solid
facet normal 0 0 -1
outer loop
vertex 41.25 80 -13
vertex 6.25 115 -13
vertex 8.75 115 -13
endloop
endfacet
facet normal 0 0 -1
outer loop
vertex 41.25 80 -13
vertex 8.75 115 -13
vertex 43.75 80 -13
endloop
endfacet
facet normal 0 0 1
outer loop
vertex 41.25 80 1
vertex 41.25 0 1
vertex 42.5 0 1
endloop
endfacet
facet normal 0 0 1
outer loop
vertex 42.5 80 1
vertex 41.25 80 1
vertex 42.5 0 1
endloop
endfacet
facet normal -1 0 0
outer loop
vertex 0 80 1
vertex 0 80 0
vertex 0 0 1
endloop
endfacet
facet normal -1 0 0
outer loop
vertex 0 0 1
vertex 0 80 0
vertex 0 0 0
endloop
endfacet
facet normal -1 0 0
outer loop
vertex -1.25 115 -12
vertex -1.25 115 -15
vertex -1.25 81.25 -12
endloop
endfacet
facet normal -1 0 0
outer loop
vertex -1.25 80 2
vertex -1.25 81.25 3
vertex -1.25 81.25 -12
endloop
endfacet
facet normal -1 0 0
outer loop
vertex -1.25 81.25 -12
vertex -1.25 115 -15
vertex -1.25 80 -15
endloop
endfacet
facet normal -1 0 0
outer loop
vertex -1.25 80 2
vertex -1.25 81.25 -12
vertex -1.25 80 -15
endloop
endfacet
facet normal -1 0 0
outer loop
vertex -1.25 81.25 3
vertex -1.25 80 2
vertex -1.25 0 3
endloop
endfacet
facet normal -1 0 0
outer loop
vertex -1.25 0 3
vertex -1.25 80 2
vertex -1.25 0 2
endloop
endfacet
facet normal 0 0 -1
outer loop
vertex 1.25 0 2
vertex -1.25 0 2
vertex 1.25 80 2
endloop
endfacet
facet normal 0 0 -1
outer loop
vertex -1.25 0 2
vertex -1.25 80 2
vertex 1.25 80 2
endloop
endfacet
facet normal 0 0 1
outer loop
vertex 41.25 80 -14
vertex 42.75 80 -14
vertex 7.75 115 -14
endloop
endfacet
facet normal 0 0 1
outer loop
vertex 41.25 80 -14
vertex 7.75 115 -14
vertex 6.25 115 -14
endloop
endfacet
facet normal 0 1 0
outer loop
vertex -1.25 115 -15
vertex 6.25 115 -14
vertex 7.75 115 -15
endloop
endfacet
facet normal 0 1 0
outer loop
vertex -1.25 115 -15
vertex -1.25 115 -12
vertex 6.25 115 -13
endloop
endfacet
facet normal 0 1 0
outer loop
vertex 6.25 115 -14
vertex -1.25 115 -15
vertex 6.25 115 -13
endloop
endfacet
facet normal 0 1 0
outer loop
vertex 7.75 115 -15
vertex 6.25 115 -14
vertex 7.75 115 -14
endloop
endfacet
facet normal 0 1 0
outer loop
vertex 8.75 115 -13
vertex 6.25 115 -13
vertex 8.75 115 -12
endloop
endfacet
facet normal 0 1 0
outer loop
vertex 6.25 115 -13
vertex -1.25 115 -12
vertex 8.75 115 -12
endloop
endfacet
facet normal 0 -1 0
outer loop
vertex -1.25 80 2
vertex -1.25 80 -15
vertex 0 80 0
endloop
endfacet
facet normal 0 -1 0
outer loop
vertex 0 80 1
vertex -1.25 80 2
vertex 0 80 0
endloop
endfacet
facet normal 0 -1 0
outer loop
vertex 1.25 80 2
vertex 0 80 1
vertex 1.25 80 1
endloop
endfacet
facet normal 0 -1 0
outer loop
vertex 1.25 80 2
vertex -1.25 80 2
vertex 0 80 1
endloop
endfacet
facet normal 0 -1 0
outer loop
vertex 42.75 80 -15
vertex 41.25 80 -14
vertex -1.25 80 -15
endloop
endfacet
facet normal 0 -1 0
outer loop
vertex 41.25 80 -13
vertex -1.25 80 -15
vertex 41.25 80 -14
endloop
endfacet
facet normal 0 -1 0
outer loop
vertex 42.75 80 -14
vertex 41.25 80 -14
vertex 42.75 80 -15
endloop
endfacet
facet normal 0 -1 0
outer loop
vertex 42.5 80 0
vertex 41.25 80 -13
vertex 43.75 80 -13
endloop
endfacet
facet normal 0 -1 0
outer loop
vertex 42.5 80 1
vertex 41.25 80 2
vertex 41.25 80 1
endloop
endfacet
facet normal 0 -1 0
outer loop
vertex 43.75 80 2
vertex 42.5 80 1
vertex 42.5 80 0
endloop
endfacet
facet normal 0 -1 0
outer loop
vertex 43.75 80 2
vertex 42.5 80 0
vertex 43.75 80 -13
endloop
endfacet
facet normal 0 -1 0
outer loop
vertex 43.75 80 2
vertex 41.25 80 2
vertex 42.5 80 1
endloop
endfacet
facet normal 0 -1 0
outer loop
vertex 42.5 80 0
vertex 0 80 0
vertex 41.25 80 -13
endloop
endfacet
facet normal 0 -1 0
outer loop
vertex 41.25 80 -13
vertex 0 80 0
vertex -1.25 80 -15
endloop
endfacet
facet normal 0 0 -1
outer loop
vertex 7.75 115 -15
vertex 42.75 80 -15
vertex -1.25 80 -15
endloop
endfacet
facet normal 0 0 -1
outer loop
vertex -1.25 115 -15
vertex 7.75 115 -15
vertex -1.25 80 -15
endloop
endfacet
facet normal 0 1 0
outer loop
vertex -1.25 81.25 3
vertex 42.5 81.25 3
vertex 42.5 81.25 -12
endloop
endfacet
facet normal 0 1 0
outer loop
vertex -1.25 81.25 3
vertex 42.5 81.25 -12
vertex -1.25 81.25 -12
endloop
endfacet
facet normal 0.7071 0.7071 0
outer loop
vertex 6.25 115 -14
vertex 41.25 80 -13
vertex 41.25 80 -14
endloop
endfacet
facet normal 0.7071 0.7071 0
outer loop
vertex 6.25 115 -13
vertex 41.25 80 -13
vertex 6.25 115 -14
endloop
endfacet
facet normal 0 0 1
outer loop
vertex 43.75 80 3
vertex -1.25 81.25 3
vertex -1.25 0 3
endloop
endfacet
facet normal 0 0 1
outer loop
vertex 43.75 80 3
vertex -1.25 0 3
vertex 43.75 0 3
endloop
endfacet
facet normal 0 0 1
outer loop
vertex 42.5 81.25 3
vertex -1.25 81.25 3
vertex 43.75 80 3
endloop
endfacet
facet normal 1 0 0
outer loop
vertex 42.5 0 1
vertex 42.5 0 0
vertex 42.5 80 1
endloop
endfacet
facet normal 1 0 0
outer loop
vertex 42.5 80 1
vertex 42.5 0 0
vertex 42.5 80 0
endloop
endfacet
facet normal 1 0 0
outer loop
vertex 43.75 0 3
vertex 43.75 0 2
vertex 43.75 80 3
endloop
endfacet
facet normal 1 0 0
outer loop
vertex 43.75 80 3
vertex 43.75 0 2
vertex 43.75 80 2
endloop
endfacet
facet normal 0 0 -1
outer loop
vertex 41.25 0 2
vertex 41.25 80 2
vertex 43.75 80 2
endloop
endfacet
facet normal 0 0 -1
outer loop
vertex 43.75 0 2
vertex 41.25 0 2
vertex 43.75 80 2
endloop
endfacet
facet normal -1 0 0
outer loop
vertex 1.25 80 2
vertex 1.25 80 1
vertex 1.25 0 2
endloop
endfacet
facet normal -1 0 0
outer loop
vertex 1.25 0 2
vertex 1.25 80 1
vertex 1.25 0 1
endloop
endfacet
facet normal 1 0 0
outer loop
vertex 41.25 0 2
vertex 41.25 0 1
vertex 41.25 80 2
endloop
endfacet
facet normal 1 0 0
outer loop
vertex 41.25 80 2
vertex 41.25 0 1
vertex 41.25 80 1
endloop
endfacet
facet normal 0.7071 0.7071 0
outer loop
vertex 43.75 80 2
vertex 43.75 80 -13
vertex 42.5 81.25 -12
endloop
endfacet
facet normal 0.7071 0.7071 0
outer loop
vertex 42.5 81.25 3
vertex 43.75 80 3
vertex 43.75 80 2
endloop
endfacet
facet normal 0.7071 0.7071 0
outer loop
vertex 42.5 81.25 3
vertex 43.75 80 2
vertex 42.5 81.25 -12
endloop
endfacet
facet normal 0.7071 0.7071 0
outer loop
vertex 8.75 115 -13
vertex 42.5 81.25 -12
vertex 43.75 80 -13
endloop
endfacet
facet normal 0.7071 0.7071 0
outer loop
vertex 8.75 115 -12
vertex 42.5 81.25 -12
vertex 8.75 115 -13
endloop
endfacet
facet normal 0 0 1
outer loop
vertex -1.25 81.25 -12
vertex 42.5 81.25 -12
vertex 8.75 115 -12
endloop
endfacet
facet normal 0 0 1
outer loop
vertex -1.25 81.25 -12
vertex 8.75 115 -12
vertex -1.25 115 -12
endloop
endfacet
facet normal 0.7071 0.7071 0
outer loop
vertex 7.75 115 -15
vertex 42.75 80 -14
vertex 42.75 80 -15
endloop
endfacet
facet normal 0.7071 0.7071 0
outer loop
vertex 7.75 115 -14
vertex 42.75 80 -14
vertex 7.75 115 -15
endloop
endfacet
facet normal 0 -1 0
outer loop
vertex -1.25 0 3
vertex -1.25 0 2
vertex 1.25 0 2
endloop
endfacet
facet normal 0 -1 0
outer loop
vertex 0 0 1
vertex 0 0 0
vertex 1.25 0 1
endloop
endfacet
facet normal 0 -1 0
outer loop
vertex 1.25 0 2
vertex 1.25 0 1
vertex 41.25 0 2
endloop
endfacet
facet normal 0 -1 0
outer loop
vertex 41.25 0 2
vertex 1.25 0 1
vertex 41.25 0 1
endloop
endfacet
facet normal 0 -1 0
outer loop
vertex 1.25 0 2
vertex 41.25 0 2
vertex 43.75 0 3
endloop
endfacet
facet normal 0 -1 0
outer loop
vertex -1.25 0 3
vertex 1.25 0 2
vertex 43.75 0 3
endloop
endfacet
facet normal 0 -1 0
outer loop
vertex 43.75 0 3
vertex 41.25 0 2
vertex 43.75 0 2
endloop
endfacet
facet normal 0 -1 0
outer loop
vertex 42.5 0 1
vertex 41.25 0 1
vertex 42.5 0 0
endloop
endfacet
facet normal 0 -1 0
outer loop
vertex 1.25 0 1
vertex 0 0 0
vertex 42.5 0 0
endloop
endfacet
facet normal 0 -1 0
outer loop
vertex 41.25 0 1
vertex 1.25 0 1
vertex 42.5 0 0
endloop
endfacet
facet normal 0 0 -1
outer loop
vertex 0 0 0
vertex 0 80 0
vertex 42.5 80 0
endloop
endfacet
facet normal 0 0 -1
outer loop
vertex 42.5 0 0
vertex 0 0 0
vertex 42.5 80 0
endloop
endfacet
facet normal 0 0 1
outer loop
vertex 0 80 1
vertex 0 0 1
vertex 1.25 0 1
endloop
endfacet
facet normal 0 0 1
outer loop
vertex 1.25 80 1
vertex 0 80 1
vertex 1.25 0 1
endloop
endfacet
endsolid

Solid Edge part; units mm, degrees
sketch "Sketch1" plane through (0, 0, 0) normal (0, 0, 1) x (1, 0, 0)
  line L0 (0, 0) -> (42.5, 0)
  line L1 (42.5, 0) -> (42.5, 80)
  line L2 (42.5, 80) -> (0, 80)
  line L3 (0, 80) -> (0, 0)
extrude "Protrusion1" add sketch "Sketch1" along normal blind 1
sketch "Sketch2" plane through (21.25, 40, 1) normal (0, 0, 1) x (1, 0, 0)
  line L0 (-20, 40) -> (-20, -40)
  line L1 (-20, -40) -> (20, -40)
  line L2 (20, -40) -> (20, 40)
  line L3 (20, 40) -> (-20, 40)
extrude "Vysunutí_2" add sketch "Sketch2" along normal blind 1
sketch "Sketch3" plane through (21.25, 40, 2) normal (0, 0, 1) x (1, 0, 0)
  line L0 (-22.5, -40) -> (22.5, -40)
  line L1 (22.5, -40) -> (22.5, 40)
  line L2 (22.5, 40) -> (-22.5, 40)
  line L3 (-22.5, 40) -> (-22.5, -40)
extrude "Vysunutí_3" add sketch "Sketch3" along normal blind 1
sketch "Sketch4" plane through (21.25, 40, 3) normal (0, 0, 1) x (1, 0, 0)
  line L0 (-22.5, 75) -> (-22.5, 40)
  line L1 (-22.5, 40) -> (22.5, 40)
  line L2 (22.5, 40) -> (-12.5, 75)
  line L3 (-22.5, 75) -> (-12.5, 75)
extrude "Protrusion2" add sketch "Sketch4" against normal blind 16
sketch "Sketch5" plane through (21.25, 57.5, 3) normal (0, 0, 1) x (0, -1, 0)
  line L0 (-23.75, 21.25) -> (-23.75, -22.5)
  line L1 (-23.75, -22.5) -> (-57.5, -22.5)
  line L2 (-57.5, -22.5) -> (-57.5, -12.5)
  line L3 (-57.5, -12.5) -> (-23.75, 21.25)
extrude "Cutout1" cut sketch "Sketch5" against normal blind 15
sketch "Sketch6" plane through (21.25, 97.5, -13) normal (0, 0, -1) x (0, -1, 0)
  line L0 (-15, 12.5) -> (-7.6278, 5.1278)
  line L1 (-7.6278, 5.1278) -> (16.25, -18.75)
  line L2 (17.5, -20) -> (16.25, -18.75)
  line L3 (17.5, 22.5) -> (17.5, -20)
  line L4 (16.25, 22.5) -> (17.5, 22.5)
  line L5 (16.25, 22.5) -> (-15, 22.5)
  line L6 (-17.5, 22.5) -> (-15, 22.5)
  line L7 (-17.5, 15) -> (-17.5, 22.5)
  line L8 (-15, 12.5) -> (-17.5, 15)
extrude "Vysunutí_6" add sketch "Sketch6" along normal blind 1
sketch "Sketch7" plane through (20, 96.25, -14) normal (0, 0, -1) x (-1, 0, 0)
  line L0 (21.25, 16.25) -> (21.25, 17.5)
  line L1 (21.25, 18.75) -> (21.25, 17.5)
  line L2 (12.25, 18.75) -> (21.25, 18.75)
  line L3 (11, 17.5) -> (12.25, 18.75)
  line L4 (9.75, 16.25) -> (11, 17.5)
  line L5 (9.75, 16.25) -> (-22.75, -16.25)
  line L6 (-22.75, -16.25) -> (-21.25, -16.25)
  line L7 (21.25, -16.25) -> (-21.25, -16.25)
  line L8 (21.25, 16.25) -> (21.25, -16.25)
extrude "Vysunutí_7" add sketch "Sketch7" along normal blind 1
